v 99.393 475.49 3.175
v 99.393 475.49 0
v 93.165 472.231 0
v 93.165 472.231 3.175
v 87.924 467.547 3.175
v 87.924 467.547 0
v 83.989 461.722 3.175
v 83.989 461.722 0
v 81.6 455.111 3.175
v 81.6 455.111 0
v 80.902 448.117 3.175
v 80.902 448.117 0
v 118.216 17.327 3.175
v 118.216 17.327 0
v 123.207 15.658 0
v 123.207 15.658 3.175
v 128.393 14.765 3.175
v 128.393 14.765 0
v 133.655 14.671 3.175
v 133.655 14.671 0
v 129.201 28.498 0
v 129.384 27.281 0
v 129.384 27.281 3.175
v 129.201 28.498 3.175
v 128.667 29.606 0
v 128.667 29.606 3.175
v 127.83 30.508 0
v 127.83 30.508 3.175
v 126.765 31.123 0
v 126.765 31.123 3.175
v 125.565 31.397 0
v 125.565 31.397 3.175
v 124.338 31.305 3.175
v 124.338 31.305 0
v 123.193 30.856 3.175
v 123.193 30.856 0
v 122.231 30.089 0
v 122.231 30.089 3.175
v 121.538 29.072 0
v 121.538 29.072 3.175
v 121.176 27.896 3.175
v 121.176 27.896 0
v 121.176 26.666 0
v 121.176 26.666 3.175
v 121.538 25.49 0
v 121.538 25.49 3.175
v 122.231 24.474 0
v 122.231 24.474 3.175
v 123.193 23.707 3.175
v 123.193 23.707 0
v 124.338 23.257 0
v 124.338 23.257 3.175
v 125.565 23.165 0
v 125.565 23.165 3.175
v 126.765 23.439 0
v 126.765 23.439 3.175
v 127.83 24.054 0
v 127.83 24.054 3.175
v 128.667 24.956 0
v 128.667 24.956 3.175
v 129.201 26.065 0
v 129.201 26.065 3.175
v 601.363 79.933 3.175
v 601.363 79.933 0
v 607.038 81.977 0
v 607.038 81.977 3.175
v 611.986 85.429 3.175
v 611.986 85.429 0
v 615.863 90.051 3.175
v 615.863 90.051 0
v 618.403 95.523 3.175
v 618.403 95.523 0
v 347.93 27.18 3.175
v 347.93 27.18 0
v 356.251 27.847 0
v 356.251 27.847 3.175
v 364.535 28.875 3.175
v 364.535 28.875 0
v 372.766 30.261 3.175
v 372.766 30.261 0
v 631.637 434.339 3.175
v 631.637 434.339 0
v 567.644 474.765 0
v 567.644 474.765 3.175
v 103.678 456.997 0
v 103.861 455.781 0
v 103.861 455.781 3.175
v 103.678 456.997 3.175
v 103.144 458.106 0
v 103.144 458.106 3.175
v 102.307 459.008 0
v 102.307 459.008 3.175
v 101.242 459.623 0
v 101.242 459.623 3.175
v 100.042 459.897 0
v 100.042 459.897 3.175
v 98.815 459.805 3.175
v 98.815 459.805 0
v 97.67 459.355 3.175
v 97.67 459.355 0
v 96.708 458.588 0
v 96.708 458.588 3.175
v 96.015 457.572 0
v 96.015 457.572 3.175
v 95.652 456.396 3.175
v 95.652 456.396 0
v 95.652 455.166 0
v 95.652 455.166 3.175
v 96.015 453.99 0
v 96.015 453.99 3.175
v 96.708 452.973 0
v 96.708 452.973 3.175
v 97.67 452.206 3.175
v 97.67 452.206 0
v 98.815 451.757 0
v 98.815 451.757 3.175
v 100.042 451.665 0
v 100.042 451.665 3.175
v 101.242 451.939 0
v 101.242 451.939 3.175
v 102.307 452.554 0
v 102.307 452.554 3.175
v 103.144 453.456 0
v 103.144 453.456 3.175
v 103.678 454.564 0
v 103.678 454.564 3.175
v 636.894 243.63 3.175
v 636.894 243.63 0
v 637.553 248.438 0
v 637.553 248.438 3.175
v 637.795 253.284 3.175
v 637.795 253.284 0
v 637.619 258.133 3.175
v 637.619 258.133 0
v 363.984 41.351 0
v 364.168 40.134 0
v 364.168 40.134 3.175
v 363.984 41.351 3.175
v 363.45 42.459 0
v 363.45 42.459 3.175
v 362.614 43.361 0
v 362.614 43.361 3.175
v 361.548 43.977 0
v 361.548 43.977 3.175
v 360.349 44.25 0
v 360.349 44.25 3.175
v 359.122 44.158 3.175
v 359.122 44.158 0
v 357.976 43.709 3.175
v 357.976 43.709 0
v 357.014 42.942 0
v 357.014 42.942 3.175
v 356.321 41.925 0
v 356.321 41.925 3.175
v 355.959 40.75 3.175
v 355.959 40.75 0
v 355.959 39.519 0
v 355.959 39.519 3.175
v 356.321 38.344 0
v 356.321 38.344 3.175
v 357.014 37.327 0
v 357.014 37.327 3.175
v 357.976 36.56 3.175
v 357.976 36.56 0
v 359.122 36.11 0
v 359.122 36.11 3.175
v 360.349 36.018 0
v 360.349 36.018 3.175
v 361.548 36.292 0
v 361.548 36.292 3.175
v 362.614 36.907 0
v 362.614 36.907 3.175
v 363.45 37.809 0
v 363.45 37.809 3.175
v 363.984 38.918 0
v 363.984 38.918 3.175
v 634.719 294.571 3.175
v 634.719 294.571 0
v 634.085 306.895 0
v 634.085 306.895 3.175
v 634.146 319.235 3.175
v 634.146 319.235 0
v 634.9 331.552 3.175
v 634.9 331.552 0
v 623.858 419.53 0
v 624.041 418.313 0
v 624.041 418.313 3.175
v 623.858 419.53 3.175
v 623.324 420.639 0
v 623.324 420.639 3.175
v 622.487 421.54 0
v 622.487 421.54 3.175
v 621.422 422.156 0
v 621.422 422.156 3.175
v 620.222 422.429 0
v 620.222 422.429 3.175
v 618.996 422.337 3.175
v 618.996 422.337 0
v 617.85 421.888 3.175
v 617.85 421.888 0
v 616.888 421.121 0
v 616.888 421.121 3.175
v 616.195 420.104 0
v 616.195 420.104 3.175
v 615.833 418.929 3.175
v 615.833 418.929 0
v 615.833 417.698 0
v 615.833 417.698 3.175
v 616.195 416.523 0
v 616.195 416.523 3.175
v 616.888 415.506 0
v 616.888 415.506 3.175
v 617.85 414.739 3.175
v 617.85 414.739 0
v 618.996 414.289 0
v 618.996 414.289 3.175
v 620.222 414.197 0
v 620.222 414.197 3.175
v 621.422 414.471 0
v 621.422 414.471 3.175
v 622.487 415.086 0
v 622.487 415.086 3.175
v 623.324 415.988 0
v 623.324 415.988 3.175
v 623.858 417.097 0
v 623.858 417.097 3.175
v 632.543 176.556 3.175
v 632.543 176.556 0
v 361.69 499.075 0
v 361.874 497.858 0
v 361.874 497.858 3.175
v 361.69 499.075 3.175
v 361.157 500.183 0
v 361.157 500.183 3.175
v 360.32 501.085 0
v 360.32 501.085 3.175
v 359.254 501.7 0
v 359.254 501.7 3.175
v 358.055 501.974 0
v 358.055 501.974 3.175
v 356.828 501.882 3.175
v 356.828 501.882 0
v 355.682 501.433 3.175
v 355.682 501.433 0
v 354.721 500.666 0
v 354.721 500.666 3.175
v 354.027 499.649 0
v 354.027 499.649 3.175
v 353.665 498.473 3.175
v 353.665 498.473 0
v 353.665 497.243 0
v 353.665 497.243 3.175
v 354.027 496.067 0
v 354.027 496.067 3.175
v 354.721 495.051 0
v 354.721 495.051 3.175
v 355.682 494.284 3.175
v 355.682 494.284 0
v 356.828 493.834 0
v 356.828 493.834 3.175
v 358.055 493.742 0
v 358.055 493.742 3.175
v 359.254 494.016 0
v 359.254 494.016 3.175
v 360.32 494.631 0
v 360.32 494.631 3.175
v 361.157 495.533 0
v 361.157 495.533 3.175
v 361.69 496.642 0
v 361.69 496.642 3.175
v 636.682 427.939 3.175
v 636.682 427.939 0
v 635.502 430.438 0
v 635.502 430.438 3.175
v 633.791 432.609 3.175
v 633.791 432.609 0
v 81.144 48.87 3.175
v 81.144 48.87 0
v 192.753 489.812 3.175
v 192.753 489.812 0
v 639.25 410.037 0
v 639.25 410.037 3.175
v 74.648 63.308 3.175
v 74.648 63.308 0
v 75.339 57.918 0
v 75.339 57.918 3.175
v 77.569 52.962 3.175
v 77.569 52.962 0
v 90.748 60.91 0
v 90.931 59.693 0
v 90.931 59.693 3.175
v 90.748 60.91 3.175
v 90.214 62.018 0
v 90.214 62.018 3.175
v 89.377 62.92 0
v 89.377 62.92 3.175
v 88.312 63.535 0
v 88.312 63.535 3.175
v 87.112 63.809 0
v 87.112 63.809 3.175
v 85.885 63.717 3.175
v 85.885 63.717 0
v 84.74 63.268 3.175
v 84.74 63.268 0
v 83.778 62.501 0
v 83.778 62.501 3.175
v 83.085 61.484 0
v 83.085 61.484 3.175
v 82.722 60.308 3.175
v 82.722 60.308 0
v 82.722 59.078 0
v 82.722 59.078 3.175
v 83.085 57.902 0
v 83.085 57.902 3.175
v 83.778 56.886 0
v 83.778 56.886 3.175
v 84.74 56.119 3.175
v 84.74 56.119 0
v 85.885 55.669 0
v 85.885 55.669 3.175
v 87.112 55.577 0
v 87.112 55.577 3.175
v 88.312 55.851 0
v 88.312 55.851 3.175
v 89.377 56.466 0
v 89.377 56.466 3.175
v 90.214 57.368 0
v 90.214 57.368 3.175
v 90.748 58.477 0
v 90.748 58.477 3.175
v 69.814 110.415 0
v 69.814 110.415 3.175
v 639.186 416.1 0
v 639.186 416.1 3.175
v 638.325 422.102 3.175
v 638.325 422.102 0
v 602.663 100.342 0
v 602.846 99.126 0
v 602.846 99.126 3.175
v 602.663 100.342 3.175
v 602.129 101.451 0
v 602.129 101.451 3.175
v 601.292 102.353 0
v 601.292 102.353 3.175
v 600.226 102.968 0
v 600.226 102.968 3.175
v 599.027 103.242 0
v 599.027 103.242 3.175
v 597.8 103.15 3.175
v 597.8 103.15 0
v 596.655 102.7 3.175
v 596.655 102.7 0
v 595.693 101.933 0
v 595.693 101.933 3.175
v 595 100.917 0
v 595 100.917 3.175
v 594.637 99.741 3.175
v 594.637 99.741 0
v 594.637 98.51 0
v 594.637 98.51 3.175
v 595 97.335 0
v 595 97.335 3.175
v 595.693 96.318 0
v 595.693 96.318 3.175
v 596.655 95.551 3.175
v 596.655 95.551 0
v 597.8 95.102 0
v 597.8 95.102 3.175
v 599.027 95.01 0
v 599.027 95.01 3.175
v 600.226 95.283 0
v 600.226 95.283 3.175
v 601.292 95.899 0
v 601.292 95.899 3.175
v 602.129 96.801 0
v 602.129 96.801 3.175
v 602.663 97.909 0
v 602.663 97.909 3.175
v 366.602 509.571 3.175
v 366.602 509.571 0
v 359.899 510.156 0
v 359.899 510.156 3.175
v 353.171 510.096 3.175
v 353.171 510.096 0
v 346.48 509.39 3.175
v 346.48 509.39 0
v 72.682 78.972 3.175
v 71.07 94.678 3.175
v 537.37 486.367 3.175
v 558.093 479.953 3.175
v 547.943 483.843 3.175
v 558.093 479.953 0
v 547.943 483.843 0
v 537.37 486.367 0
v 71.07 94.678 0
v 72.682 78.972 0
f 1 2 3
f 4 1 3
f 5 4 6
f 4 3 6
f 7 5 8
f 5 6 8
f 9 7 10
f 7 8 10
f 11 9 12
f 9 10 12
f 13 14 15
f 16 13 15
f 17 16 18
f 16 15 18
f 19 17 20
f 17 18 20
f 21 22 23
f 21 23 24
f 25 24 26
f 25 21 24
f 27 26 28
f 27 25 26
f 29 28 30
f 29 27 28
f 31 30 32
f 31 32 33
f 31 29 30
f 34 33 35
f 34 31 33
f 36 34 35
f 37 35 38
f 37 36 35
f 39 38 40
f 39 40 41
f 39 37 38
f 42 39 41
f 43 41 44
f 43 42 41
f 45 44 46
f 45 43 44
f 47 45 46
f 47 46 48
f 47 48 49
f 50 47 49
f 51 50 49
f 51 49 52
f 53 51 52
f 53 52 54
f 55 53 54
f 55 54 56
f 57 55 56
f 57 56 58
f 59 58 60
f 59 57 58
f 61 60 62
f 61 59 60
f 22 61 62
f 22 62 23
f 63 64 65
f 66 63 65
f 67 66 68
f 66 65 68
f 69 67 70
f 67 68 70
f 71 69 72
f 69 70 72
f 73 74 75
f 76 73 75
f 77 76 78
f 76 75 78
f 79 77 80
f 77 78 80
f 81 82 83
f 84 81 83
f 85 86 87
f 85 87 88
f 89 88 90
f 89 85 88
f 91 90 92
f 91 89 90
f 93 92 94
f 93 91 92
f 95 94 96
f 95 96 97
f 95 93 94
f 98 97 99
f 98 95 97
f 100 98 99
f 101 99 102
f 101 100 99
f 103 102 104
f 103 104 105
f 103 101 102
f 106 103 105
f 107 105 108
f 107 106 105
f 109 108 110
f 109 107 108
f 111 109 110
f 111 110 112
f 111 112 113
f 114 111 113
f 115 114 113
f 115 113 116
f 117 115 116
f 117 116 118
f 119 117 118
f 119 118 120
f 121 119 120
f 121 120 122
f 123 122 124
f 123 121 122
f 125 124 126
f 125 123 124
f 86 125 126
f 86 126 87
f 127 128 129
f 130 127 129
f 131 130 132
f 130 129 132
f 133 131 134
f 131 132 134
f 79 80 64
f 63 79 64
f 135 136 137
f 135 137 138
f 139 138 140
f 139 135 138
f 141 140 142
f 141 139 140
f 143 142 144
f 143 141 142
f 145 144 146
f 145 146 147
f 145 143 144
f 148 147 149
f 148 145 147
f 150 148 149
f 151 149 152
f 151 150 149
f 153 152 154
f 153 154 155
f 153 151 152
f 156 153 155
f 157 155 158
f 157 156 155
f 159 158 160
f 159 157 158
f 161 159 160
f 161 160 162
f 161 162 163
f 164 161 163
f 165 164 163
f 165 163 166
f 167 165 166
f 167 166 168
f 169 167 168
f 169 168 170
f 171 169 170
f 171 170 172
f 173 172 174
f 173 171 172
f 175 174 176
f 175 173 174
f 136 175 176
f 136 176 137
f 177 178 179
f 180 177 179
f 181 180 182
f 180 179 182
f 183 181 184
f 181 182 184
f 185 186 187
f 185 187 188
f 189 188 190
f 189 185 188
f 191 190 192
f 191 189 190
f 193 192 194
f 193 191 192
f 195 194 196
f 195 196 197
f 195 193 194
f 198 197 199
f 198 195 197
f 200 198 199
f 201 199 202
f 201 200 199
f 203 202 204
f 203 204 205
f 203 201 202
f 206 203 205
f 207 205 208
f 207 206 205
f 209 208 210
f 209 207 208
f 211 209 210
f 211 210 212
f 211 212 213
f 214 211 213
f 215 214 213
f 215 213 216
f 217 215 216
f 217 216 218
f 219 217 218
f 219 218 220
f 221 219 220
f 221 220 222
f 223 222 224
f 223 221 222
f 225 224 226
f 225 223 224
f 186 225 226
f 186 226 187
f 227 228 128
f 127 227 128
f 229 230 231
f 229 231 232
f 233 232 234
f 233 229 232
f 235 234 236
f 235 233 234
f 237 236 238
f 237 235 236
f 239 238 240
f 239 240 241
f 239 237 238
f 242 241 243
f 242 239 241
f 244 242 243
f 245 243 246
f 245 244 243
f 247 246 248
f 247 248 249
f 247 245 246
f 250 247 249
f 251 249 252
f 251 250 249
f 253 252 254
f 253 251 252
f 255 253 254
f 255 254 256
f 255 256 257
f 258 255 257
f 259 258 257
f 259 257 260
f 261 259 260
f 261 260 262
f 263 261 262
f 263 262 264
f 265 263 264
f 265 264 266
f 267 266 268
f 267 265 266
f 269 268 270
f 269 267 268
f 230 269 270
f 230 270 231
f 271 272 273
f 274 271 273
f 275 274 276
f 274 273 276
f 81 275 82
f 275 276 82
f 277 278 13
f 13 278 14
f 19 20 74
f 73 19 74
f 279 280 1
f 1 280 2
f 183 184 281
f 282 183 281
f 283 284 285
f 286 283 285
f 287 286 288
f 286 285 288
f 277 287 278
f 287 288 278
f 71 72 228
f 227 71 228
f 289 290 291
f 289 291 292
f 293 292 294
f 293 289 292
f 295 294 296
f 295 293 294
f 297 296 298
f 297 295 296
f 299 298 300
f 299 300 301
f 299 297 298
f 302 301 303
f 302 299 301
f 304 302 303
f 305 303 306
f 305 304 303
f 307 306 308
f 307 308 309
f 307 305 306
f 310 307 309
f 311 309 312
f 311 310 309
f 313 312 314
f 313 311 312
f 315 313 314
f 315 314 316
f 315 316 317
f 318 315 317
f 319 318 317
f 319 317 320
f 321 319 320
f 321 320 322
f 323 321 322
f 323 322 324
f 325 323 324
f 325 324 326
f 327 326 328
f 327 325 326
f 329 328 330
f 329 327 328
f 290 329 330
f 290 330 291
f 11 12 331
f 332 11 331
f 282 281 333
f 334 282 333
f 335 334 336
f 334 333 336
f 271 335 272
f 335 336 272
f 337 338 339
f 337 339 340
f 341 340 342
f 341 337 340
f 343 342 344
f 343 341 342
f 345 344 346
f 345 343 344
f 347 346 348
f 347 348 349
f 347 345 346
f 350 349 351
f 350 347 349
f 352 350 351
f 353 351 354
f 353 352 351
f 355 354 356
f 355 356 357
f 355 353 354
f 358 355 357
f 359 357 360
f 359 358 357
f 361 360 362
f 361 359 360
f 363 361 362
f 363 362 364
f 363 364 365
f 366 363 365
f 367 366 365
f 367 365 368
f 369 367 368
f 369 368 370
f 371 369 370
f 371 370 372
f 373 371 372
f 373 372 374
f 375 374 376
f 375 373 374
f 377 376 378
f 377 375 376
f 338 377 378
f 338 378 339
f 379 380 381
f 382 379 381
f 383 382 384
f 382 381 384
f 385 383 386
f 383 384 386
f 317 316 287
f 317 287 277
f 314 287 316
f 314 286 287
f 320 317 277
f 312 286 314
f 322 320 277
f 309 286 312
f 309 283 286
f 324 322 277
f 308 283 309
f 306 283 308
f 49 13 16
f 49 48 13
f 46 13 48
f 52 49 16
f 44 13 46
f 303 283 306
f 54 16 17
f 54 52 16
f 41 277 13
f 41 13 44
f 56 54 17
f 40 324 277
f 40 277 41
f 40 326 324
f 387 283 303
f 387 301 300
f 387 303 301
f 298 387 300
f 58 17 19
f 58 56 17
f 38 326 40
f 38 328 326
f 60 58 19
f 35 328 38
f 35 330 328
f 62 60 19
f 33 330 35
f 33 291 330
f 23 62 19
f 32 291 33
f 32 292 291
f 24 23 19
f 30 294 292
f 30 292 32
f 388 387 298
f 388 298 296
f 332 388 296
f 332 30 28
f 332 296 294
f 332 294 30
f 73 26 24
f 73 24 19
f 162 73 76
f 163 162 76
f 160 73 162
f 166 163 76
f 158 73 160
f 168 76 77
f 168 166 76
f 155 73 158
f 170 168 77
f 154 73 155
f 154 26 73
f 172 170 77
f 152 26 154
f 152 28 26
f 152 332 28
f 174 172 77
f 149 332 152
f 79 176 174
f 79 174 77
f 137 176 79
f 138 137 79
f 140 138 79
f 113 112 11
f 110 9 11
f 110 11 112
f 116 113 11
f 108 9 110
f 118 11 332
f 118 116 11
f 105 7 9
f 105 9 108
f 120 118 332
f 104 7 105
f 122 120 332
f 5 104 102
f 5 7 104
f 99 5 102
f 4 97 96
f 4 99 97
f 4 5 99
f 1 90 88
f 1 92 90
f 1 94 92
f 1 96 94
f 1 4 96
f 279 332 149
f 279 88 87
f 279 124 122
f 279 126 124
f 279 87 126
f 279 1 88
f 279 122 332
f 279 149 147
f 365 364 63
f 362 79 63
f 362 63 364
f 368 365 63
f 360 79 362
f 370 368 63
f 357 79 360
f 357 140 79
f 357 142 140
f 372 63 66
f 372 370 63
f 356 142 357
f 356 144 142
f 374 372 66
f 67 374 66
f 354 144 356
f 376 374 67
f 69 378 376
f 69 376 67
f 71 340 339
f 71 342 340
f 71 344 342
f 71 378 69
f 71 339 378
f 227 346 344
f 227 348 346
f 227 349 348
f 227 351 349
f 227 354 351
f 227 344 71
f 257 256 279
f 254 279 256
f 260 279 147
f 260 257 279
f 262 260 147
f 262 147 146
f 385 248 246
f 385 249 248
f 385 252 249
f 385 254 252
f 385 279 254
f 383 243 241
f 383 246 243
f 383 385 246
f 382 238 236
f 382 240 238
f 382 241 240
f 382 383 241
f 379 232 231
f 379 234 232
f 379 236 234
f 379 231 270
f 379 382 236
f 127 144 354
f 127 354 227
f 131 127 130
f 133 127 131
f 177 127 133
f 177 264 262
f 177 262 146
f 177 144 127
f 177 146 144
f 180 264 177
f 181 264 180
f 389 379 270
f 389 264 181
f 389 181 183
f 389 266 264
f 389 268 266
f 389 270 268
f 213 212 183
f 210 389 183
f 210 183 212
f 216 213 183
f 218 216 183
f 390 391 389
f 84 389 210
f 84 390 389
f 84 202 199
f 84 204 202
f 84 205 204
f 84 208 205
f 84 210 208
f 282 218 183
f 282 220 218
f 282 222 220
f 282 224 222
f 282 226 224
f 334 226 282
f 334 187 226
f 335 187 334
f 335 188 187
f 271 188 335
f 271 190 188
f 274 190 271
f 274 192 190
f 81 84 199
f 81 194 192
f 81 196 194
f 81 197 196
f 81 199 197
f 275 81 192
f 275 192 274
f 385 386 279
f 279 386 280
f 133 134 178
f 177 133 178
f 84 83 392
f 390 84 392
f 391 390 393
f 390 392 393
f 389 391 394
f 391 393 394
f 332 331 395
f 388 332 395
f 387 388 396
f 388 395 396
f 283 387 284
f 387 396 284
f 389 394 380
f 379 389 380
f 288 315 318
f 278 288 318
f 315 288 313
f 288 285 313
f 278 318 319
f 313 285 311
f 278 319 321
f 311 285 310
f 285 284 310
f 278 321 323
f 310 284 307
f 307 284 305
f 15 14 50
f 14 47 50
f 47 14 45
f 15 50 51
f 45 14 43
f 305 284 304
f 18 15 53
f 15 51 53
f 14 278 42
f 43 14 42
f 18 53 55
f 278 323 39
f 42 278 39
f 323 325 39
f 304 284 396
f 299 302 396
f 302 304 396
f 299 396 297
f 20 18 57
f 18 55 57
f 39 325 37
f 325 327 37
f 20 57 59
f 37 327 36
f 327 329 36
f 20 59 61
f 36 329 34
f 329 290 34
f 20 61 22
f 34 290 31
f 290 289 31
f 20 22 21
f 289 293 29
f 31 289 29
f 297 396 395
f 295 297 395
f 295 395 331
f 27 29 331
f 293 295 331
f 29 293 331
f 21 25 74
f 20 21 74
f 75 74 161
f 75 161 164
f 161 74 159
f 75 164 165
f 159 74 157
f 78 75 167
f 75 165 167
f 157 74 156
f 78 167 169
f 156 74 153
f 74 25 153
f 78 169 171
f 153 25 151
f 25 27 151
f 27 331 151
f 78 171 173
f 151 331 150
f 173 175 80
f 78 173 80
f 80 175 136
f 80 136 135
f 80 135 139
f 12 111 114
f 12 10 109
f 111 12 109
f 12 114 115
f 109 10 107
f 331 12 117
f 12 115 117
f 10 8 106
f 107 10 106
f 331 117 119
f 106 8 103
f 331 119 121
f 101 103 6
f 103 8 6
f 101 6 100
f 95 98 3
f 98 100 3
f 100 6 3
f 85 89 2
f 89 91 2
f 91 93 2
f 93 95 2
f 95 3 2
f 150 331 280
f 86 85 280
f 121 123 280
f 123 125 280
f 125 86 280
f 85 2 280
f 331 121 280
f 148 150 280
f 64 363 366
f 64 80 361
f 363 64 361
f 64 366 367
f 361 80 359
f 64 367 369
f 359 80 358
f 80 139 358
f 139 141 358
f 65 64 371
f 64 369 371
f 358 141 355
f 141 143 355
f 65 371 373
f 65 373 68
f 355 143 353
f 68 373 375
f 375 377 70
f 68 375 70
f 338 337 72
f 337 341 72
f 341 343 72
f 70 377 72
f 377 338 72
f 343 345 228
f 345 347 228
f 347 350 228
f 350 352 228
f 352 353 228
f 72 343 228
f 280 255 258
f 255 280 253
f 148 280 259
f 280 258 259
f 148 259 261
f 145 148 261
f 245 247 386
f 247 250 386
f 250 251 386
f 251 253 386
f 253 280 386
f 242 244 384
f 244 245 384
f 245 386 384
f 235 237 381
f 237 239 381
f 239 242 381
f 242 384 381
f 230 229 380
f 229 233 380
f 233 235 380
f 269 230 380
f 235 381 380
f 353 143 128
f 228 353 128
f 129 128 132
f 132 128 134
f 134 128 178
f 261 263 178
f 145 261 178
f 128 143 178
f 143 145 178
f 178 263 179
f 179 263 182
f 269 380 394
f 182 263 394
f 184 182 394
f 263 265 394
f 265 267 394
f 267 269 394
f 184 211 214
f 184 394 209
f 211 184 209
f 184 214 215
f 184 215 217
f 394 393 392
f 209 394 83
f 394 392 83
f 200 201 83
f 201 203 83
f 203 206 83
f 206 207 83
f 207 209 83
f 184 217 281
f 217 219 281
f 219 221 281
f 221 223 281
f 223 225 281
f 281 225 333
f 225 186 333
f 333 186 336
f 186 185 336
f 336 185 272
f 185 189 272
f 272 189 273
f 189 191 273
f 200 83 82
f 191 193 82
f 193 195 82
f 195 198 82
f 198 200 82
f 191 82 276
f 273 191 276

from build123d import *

# Parameters (mm, degrees)
F0_R     = 4.1275
F1_DEPTH = 3.175


# Not quite as in the source:
# - a feature names something its author has since deleted; it is built from what else it names


with BuildPart() as f1:
    # F0 (on Top) → F1 (new body)
    with BuildSketch(Plane.XY):
        with BuildLine():
            Line((81.1441976903, 48.870176137), (118.2163868425, 17.3270926481))
            ThreePointArc((118.2163868425, 17.3270926481), (125.7830950318, 15.1126819317), (133.6548019526, 14.6711869767))
            Line((133.6548019526, 14.6711869767), (347.9302216647, 27.1796528851))
            ThreePointArc((347.9302216647, 27.1796528851), (360.3982548534, 28.3159145983), (372.7658678172, 30.2614458507))
            Line((372.7658678172, 30.2614458507), (601.3625849364, 79.9327344304))
            ThreePointArc((601.3625849364, 79.9327344304), (611.9858366517, 85.4292367374), (618.4030760406, 95.5229998236))
            Line((618.4030760406, 95.5229998236), (632.5431455253, 176.5561104422))
            Line((632.5431455253, 176.5561104422), (636.893926966, 243.6304838067))
            ThreePointArc((636.893926966, 243.6304838067), (637.7262973987, 250.8582634049), (637.6190770743, 258.1330240374))
            Line((637.6190770743, 258.1330240374), (634.718536759, 294.5707376489))
            ThreePointArc((634.718536759, 294.5707376489), (634.0289947151, 313.0653425318), (634.89985466, 331.5522968769))
            Line((634.89985466, 331.5522968769), (639.2500827298, 410.037428213))
            ThreePointArc((639.2500827298, 410.037428213), (638.8544702471, 419.1155099086), (636.6822238963, 427.938741873))
            ThreePointArc((636.6822238963, 427.938741873), (634.7085093964, 431.5717815797), (631.6367376922, 434.3392253523))
            Line((631.6367376922, 434.3392253523), (567.6441777823, 474.7651219969))
            ThreePointArc((567.6441777823, 474.7651219969), (553.0816862682, 482.0654658914), (537.3700250266, 486.3671959048))
            Line((537.3700250266, 486.3671959048), (366.6023005126, 509.5713139182))
            ThreePointArc((366.6023005126, 509.5713139182), (356.5346140159, 510.2066384634), (346.480010855, 509.3899965888))
            Line((346.480010855, 509.3899965888), (192.7528221486, 489.8115695124))
            Line((192.7528221486, 489.8115695124), (99.3925322173, 475.4902721053))
            ThreePointArc((99.3925322173, 475.4902721053), (85.7762927803, 464.7559785435), (80.9017557977, 448.1166899806))
            Line((80.9017557977, 448.1166899806), (69.8140699742, 110.4154438382))
            ThreePointArc((69.8140699742, 110.4154438382), (71.8313111538, 86.8204891023), (74.6482450841, 63.3075982934))
            ThreePointArc((74.6482450841, 63.3075982934), (76.2705931102, 55.3574544062), (81.1441976903, 48.870176137))
        make_face()
        with Locations((125.2569147965, 27.2811080985)):
            Circle(F0_R, mode=Mode.SUBTRACT)
        with Locations((86.803833318, 59.6931402198)):
            Circle(F0_R, mode=Mode.SUBTRACT)
        with Locations((360.0400942892, 40.1343675154)):
            Circle(F0_R, mode=Mode.SUBTRACT)
        with Locations((598.7183749899, 99.1256637739)):
            Circle(F0_R, mode=Mode.SUBTRACT)
        with Locations((99.7337432835, 455.780702147)):
            Circle(F0_R, mode=Mode.SUBTRACT)
        with Locations((357.7462032552, 497.8582725917)):
            Circle(F0_R, mode=Mode.SUBTRACT)
        with Locations((619.9139634468, 418.3134020176)):
            Circle(F0_R, mode=Mode.SUBTRACT)
    extrude(amount=F1_DEPTH)


solid = f1.part
